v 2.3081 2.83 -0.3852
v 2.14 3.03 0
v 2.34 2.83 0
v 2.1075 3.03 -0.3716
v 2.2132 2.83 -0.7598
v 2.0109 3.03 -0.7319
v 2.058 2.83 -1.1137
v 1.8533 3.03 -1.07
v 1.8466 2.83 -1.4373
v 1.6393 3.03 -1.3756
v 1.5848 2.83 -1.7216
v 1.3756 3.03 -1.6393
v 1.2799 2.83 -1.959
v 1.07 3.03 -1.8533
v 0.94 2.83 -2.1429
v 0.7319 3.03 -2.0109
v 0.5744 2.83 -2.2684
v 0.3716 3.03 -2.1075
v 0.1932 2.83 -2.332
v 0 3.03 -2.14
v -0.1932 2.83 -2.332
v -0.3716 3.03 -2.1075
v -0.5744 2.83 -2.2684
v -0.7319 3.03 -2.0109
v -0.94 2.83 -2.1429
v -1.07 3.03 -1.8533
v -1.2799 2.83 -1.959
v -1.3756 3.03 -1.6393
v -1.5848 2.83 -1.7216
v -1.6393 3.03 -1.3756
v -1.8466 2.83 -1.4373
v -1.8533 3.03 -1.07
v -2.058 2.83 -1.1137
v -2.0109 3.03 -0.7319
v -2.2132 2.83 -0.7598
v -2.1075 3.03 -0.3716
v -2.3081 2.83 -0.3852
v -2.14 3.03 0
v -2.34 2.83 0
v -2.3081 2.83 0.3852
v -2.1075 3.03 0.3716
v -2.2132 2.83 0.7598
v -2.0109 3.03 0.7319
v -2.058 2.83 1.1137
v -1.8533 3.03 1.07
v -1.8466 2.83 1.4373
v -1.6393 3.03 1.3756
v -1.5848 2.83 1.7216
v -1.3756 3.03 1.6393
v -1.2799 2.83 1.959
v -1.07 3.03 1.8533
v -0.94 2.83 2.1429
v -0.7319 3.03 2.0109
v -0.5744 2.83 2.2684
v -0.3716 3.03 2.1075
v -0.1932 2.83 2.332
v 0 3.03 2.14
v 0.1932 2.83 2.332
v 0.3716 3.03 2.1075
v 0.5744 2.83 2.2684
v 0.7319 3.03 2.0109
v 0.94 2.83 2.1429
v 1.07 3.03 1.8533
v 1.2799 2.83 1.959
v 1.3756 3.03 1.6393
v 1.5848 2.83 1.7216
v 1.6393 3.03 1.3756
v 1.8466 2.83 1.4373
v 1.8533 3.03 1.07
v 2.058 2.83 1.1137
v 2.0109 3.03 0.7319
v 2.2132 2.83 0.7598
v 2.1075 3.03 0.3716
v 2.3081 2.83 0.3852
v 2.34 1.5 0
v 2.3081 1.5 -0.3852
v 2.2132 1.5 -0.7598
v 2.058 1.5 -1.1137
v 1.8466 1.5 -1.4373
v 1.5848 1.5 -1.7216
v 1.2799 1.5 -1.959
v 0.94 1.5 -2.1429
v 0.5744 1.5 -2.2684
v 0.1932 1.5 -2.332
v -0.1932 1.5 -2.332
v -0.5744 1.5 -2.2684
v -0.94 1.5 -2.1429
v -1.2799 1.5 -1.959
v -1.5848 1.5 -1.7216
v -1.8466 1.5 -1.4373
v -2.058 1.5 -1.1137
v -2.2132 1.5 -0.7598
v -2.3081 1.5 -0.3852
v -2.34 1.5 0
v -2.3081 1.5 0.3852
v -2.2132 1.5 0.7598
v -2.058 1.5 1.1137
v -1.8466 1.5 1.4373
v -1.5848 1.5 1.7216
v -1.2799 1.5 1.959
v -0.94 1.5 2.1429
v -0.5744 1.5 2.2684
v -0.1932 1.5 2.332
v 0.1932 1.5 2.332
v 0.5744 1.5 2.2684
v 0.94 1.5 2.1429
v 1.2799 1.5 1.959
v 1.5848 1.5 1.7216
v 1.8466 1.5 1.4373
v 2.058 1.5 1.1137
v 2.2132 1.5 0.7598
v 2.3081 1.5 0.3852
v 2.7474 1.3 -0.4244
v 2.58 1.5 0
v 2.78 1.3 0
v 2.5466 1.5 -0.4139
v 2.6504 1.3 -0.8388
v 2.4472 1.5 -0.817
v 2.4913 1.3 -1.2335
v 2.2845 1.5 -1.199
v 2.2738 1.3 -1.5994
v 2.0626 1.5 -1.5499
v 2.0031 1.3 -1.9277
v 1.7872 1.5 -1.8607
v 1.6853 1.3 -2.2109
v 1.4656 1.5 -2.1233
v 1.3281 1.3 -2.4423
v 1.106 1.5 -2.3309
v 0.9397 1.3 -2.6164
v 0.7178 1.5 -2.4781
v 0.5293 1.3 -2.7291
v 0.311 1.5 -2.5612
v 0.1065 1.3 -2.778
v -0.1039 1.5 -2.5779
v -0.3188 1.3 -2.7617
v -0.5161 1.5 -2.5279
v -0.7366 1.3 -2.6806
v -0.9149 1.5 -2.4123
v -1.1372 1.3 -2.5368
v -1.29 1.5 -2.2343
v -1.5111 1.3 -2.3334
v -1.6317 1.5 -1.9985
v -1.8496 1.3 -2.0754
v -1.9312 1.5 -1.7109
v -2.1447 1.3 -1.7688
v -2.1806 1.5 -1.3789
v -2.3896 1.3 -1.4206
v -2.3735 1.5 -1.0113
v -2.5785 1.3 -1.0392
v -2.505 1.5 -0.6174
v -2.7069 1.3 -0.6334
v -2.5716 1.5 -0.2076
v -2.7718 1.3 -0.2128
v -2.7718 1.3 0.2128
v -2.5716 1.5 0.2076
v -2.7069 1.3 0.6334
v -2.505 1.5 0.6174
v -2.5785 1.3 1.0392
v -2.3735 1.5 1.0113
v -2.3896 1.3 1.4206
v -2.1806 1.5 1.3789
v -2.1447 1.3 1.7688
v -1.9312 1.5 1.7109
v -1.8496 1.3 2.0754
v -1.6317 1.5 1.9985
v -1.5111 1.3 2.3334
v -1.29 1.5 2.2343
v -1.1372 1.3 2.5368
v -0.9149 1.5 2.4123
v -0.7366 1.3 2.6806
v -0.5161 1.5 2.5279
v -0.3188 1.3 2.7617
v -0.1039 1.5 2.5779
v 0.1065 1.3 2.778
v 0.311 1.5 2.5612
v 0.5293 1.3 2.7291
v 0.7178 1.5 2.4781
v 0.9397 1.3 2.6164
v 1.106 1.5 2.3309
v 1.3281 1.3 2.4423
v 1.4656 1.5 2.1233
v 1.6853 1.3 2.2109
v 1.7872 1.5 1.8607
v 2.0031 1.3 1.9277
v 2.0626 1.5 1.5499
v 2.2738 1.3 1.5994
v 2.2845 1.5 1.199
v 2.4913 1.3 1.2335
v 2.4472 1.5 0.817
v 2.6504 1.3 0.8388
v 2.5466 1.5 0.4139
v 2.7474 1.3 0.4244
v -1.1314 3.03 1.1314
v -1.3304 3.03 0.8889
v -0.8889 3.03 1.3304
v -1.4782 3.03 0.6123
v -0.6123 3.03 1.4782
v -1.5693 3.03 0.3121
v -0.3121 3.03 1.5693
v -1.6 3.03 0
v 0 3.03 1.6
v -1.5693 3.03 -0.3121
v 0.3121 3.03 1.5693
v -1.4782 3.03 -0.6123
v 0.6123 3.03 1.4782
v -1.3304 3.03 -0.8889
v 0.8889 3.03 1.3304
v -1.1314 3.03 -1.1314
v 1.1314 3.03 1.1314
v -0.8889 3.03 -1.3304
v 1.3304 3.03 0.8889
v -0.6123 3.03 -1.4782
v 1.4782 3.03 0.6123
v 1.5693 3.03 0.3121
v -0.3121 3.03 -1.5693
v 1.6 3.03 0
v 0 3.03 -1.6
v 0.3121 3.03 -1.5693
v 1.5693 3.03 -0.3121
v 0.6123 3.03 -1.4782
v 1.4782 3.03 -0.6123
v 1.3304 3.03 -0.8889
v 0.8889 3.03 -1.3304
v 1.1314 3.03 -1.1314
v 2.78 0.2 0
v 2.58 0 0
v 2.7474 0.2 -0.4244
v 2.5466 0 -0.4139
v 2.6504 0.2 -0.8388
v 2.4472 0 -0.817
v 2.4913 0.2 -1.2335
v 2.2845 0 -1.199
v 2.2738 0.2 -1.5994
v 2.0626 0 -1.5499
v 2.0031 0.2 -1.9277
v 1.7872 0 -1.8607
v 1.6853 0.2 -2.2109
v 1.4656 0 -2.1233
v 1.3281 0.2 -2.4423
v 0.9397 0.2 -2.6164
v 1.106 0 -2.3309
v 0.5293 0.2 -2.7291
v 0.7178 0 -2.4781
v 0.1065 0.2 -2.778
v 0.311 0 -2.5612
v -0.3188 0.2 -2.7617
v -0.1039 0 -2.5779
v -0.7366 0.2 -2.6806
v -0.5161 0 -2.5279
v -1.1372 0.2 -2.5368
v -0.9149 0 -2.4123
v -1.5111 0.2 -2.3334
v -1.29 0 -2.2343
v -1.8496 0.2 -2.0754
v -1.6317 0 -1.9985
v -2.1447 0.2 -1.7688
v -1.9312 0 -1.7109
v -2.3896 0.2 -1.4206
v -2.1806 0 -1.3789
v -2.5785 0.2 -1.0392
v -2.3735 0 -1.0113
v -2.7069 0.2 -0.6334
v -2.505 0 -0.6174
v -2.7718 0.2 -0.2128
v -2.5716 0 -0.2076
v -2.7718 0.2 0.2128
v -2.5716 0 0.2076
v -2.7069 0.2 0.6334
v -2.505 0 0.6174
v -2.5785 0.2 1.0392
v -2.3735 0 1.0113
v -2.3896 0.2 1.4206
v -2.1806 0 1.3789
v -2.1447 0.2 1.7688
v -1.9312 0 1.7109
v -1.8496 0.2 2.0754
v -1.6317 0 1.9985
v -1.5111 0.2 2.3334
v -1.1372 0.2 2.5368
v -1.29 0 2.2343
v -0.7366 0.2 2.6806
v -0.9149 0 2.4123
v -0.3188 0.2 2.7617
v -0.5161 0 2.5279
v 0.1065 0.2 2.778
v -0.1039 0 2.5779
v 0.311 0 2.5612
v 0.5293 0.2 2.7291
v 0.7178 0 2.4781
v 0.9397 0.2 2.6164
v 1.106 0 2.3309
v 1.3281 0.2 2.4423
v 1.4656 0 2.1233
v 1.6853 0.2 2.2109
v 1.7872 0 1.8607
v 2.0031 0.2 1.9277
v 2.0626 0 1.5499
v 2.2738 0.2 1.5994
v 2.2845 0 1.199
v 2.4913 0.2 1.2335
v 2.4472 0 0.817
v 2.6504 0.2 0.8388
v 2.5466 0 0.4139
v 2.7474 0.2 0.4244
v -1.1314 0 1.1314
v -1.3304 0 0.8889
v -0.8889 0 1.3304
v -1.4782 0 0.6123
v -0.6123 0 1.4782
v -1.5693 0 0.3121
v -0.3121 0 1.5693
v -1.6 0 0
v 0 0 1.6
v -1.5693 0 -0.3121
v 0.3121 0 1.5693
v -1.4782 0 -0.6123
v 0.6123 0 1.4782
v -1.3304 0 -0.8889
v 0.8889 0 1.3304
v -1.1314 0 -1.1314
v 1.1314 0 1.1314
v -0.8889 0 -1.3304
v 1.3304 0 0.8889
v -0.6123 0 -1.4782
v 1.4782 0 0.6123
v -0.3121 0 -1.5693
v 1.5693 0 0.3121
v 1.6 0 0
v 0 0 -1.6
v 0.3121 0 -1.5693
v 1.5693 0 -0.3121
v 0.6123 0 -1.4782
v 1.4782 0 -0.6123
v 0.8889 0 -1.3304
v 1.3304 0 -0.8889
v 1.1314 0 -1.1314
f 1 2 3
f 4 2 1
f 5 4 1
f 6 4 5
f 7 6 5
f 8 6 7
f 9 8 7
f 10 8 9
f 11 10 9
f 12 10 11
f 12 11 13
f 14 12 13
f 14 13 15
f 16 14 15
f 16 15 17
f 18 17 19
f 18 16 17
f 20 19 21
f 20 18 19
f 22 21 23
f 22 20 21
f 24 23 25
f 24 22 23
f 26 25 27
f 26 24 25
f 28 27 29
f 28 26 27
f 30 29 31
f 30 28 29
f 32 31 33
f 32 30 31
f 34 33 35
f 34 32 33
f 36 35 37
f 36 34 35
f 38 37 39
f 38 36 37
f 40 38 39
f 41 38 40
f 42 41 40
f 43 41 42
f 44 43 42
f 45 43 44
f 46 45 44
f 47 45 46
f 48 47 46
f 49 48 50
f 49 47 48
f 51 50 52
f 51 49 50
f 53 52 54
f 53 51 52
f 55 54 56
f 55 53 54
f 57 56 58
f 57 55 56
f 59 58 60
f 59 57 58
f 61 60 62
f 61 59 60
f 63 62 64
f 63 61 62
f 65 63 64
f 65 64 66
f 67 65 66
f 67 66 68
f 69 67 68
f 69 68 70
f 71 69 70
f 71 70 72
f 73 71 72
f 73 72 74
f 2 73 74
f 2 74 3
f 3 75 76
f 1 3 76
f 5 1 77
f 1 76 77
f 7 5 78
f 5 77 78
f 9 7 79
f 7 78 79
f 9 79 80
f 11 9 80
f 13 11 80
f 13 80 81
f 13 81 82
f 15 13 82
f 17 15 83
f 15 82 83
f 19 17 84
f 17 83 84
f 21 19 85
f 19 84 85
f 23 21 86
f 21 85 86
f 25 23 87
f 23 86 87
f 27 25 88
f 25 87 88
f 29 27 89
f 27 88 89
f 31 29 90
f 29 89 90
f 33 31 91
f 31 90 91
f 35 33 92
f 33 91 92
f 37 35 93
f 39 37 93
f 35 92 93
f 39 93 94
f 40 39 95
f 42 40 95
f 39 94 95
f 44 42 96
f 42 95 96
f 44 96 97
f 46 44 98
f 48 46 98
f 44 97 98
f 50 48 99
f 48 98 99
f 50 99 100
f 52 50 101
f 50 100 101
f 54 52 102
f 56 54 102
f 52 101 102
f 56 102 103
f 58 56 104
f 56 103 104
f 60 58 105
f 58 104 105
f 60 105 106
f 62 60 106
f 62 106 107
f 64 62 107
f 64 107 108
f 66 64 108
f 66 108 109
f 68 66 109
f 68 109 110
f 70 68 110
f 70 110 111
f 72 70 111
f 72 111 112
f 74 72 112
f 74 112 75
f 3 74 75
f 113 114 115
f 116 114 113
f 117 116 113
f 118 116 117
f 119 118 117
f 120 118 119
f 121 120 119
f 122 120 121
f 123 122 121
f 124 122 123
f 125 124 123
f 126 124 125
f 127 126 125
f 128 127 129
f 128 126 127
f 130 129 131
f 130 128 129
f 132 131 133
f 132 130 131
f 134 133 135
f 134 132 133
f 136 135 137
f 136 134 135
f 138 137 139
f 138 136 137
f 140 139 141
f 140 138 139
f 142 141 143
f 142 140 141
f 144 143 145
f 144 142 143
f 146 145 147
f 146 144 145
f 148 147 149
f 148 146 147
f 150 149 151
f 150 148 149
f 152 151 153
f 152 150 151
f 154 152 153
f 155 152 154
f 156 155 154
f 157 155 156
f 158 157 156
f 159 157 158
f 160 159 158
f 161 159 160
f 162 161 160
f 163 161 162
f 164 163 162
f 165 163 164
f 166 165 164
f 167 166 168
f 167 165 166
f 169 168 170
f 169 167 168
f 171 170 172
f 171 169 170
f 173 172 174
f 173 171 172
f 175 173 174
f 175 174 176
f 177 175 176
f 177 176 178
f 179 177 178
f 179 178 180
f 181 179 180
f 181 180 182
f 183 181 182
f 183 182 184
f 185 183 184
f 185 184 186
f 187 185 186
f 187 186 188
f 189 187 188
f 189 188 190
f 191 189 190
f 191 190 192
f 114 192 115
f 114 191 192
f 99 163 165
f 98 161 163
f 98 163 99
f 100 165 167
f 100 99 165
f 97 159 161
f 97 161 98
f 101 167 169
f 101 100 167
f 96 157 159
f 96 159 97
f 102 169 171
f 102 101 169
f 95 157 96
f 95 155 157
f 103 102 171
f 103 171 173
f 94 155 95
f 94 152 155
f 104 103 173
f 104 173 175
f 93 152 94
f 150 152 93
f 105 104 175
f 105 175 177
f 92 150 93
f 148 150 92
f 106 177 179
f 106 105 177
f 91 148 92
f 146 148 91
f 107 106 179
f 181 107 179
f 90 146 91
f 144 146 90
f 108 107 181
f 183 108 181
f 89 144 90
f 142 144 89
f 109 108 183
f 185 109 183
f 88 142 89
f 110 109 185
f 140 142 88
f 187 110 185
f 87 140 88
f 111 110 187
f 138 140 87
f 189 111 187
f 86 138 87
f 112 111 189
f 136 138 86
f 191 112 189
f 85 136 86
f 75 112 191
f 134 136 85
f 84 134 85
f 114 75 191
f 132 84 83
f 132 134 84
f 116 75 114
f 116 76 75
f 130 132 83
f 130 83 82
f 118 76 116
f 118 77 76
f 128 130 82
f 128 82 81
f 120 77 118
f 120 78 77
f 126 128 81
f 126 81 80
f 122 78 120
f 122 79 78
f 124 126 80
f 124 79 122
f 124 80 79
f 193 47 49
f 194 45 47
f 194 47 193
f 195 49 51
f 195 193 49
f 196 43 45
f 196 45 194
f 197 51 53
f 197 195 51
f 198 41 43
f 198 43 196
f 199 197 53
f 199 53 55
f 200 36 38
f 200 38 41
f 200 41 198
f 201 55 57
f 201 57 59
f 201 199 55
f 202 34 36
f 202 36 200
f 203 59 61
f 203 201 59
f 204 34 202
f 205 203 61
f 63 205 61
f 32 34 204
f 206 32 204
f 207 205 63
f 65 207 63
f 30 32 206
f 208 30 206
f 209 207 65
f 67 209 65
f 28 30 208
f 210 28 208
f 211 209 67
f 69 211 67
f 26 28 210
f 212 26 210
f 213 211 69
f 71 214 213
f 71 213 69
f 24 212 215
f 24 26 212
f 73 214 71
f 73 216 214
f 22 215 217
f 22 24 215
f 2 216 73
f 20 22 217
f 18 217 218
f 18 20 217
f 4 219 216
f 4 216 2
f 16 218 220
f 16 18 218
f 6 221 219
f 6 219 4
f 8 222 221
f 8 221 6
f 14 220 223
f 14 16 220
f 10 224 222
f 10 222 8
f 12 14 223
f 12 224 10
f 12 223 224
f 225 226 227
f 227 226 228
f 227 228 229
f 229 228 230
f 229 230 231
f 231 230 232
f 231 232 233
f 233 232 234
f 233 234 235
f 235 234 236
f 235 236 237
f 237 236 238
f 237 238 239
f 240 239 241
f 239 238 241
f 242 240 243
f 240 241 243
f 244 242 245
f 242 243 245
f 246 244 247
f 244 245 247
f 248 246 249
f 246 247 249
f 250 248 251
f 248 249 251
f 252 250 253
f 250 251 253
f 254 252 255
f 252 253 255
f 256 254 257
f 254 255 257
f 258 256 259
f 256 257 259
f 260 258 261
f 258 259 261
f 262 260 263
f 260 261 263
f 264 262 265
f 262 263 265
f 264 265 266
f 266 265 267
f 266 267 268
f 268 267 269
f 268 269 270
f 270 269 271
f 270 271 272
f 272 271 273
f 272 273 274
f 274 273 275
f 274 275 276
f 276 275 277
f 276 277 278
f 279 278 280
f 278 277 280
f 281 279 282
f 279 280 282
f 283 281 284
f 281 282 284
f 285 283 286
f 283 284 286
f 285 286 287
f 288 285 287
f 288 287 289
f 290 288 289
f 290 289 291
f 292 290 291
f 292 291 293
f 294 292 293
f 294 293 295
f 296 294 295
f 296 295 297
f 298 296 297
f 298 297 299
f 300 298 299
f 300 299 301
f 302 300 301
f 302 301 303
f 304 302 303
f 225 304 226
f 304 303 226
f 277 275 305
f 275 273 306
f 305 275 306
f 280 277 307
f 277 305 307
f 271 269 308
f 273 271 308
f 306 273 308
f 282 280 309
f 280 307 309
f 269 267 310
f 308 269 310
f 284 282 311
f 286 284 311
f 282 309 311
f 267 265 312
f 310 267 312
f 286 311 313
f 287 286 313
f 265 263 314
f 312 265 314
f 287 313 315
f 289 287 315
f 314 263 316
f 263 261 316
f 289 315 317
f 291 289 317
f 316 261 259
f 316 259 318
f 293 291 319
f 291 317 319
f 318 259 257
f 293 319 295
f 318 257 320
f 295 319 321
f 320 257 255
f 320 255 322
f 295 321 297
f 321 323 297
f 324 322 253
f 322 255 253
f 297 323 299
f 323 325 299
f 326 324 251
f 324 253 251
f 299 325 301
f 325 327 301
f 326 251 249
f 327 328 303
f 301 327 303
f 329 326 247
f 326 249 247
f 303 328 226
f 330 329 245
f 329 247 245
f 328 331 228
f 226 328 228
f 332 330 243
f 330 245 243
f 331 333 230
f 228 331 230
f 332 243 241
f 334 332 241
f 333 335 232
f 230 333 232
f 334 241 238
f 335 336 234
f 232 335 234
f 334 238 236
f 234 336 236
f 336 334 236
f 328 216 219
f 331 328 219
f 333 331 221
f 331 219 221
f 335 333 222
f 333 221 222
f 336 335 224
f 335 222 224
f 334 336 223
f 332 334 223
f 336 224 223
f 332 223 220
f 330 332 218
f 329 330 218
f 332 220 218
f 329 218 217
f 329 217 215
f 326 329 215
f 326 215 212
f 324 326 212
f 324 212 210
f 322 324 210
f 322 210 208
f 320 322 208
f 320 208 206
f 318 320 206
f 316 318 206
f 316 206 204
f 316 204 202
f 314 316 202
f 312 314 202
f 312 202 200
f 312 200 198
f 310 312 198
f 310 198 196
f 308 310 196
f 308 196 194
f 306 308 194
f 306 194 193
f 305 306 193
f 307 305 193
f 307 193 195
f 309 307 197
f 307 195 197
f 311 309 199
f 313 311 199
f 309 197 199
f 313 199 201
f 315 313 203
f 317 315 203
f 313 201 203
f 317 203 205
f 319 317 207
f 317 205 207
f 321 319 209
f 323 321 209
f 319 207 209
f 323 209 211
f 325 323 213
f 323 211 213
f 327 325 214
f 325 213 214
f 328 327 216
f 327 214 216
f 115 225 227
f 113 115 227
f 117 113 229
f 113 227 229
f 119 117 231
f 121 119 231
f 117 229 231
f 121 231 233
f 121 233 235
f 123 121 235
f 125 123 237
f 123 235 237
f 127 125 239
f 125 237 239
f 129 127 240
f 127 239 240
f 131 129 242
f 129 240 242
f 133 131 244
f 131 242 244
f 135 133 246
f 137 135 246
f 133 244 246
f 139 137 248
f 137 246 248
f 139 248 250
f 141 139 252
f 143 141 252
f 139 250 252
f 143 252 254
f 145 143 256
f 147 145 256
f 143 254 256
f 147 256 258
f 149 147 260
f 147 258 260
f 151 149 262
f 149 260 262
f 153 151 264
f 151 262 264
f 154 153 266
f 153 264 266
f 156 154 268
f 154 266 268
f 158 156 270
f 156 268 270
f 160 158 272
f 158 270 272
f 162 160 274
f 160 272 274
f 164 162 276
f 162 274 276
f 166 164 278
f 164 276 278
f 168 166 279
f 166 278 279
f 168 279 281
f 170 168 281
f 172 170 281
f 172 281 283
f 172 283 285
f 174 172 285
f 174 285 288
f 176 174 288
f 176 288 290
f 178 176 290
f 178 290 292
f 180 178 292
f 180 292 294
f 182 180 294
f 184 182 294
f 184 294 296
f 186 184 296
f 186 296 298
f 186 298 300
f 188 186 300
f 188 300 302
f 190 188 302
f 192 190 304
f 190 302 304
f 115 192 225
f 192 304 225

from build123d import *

# Parameters (mm, degrees)
SKETCH1_R           = 2.78
BOSS_EXTRUDE1_DEPTH = 1.5
CHAMFER1_SIZE       = 0.2
SKETCH2_R           = 2.34
BOSS_EXTRUDE2_DEPTH = 1.53
CHAMFER2_SIZE       = 0.2
SKETCH3_R           = 1.6
CUT_EXTRUDE1_DEPTH  = 4.03


with BuildPart() as part:
    # Sketch1 → Boss-Extrude1 (new body)
    with BuildSketch(Plane(origin=(0, 0, 0), x_dir=(1, 0, 0), z_dir=(0, 1, 0))):
        Circle(SKETCH1_R)
    extrude(amount=BOSS_EXTRUDE1_DEPTH)

    # Chamfer1
    chamfer1_edges = [part.edges().sort_by_distance(p)[0] for p in [
        (-2.78, 0, 0),
        (-2.78, 1.5, 0),
    ]]
    chamfer(chamfer1_edges, length=CHAMFER1_SIZE)

    # Sketch2 → Boss-Extrude2 (add)
    with BuildSketch(Plane(origin=(0, 1.5, 0), x_dir=(1, 0, 0), z_dir=(0, 1, 0))):
        Circle(SKETCH2_R)
    extrude(amount=BOSS_EXTRUDE2_DEPTH)

    # Chamfer2
    chamfer2_edges = [part.edges().sort_by_distance(p)[0] for p in [
        (-2.34, 3.03, 0),
    ]]
    chamfer(chamfer2_edges, length=CHAMFER2_SIZE)

    # Sketch3 → Cut-Extrude1 (cut, through all)
    with BuildSketch(Plane(origin=(0, 3.03, 0), x_dir=(1, 0, 0), z_dir=(0, 1, 0))):
        Circle(SKETCH3_R)
    extrude(amount=-CUT_EXTRUDE1_DEPTH, mode=Mode.SUBTRACT)


solid = part.part
